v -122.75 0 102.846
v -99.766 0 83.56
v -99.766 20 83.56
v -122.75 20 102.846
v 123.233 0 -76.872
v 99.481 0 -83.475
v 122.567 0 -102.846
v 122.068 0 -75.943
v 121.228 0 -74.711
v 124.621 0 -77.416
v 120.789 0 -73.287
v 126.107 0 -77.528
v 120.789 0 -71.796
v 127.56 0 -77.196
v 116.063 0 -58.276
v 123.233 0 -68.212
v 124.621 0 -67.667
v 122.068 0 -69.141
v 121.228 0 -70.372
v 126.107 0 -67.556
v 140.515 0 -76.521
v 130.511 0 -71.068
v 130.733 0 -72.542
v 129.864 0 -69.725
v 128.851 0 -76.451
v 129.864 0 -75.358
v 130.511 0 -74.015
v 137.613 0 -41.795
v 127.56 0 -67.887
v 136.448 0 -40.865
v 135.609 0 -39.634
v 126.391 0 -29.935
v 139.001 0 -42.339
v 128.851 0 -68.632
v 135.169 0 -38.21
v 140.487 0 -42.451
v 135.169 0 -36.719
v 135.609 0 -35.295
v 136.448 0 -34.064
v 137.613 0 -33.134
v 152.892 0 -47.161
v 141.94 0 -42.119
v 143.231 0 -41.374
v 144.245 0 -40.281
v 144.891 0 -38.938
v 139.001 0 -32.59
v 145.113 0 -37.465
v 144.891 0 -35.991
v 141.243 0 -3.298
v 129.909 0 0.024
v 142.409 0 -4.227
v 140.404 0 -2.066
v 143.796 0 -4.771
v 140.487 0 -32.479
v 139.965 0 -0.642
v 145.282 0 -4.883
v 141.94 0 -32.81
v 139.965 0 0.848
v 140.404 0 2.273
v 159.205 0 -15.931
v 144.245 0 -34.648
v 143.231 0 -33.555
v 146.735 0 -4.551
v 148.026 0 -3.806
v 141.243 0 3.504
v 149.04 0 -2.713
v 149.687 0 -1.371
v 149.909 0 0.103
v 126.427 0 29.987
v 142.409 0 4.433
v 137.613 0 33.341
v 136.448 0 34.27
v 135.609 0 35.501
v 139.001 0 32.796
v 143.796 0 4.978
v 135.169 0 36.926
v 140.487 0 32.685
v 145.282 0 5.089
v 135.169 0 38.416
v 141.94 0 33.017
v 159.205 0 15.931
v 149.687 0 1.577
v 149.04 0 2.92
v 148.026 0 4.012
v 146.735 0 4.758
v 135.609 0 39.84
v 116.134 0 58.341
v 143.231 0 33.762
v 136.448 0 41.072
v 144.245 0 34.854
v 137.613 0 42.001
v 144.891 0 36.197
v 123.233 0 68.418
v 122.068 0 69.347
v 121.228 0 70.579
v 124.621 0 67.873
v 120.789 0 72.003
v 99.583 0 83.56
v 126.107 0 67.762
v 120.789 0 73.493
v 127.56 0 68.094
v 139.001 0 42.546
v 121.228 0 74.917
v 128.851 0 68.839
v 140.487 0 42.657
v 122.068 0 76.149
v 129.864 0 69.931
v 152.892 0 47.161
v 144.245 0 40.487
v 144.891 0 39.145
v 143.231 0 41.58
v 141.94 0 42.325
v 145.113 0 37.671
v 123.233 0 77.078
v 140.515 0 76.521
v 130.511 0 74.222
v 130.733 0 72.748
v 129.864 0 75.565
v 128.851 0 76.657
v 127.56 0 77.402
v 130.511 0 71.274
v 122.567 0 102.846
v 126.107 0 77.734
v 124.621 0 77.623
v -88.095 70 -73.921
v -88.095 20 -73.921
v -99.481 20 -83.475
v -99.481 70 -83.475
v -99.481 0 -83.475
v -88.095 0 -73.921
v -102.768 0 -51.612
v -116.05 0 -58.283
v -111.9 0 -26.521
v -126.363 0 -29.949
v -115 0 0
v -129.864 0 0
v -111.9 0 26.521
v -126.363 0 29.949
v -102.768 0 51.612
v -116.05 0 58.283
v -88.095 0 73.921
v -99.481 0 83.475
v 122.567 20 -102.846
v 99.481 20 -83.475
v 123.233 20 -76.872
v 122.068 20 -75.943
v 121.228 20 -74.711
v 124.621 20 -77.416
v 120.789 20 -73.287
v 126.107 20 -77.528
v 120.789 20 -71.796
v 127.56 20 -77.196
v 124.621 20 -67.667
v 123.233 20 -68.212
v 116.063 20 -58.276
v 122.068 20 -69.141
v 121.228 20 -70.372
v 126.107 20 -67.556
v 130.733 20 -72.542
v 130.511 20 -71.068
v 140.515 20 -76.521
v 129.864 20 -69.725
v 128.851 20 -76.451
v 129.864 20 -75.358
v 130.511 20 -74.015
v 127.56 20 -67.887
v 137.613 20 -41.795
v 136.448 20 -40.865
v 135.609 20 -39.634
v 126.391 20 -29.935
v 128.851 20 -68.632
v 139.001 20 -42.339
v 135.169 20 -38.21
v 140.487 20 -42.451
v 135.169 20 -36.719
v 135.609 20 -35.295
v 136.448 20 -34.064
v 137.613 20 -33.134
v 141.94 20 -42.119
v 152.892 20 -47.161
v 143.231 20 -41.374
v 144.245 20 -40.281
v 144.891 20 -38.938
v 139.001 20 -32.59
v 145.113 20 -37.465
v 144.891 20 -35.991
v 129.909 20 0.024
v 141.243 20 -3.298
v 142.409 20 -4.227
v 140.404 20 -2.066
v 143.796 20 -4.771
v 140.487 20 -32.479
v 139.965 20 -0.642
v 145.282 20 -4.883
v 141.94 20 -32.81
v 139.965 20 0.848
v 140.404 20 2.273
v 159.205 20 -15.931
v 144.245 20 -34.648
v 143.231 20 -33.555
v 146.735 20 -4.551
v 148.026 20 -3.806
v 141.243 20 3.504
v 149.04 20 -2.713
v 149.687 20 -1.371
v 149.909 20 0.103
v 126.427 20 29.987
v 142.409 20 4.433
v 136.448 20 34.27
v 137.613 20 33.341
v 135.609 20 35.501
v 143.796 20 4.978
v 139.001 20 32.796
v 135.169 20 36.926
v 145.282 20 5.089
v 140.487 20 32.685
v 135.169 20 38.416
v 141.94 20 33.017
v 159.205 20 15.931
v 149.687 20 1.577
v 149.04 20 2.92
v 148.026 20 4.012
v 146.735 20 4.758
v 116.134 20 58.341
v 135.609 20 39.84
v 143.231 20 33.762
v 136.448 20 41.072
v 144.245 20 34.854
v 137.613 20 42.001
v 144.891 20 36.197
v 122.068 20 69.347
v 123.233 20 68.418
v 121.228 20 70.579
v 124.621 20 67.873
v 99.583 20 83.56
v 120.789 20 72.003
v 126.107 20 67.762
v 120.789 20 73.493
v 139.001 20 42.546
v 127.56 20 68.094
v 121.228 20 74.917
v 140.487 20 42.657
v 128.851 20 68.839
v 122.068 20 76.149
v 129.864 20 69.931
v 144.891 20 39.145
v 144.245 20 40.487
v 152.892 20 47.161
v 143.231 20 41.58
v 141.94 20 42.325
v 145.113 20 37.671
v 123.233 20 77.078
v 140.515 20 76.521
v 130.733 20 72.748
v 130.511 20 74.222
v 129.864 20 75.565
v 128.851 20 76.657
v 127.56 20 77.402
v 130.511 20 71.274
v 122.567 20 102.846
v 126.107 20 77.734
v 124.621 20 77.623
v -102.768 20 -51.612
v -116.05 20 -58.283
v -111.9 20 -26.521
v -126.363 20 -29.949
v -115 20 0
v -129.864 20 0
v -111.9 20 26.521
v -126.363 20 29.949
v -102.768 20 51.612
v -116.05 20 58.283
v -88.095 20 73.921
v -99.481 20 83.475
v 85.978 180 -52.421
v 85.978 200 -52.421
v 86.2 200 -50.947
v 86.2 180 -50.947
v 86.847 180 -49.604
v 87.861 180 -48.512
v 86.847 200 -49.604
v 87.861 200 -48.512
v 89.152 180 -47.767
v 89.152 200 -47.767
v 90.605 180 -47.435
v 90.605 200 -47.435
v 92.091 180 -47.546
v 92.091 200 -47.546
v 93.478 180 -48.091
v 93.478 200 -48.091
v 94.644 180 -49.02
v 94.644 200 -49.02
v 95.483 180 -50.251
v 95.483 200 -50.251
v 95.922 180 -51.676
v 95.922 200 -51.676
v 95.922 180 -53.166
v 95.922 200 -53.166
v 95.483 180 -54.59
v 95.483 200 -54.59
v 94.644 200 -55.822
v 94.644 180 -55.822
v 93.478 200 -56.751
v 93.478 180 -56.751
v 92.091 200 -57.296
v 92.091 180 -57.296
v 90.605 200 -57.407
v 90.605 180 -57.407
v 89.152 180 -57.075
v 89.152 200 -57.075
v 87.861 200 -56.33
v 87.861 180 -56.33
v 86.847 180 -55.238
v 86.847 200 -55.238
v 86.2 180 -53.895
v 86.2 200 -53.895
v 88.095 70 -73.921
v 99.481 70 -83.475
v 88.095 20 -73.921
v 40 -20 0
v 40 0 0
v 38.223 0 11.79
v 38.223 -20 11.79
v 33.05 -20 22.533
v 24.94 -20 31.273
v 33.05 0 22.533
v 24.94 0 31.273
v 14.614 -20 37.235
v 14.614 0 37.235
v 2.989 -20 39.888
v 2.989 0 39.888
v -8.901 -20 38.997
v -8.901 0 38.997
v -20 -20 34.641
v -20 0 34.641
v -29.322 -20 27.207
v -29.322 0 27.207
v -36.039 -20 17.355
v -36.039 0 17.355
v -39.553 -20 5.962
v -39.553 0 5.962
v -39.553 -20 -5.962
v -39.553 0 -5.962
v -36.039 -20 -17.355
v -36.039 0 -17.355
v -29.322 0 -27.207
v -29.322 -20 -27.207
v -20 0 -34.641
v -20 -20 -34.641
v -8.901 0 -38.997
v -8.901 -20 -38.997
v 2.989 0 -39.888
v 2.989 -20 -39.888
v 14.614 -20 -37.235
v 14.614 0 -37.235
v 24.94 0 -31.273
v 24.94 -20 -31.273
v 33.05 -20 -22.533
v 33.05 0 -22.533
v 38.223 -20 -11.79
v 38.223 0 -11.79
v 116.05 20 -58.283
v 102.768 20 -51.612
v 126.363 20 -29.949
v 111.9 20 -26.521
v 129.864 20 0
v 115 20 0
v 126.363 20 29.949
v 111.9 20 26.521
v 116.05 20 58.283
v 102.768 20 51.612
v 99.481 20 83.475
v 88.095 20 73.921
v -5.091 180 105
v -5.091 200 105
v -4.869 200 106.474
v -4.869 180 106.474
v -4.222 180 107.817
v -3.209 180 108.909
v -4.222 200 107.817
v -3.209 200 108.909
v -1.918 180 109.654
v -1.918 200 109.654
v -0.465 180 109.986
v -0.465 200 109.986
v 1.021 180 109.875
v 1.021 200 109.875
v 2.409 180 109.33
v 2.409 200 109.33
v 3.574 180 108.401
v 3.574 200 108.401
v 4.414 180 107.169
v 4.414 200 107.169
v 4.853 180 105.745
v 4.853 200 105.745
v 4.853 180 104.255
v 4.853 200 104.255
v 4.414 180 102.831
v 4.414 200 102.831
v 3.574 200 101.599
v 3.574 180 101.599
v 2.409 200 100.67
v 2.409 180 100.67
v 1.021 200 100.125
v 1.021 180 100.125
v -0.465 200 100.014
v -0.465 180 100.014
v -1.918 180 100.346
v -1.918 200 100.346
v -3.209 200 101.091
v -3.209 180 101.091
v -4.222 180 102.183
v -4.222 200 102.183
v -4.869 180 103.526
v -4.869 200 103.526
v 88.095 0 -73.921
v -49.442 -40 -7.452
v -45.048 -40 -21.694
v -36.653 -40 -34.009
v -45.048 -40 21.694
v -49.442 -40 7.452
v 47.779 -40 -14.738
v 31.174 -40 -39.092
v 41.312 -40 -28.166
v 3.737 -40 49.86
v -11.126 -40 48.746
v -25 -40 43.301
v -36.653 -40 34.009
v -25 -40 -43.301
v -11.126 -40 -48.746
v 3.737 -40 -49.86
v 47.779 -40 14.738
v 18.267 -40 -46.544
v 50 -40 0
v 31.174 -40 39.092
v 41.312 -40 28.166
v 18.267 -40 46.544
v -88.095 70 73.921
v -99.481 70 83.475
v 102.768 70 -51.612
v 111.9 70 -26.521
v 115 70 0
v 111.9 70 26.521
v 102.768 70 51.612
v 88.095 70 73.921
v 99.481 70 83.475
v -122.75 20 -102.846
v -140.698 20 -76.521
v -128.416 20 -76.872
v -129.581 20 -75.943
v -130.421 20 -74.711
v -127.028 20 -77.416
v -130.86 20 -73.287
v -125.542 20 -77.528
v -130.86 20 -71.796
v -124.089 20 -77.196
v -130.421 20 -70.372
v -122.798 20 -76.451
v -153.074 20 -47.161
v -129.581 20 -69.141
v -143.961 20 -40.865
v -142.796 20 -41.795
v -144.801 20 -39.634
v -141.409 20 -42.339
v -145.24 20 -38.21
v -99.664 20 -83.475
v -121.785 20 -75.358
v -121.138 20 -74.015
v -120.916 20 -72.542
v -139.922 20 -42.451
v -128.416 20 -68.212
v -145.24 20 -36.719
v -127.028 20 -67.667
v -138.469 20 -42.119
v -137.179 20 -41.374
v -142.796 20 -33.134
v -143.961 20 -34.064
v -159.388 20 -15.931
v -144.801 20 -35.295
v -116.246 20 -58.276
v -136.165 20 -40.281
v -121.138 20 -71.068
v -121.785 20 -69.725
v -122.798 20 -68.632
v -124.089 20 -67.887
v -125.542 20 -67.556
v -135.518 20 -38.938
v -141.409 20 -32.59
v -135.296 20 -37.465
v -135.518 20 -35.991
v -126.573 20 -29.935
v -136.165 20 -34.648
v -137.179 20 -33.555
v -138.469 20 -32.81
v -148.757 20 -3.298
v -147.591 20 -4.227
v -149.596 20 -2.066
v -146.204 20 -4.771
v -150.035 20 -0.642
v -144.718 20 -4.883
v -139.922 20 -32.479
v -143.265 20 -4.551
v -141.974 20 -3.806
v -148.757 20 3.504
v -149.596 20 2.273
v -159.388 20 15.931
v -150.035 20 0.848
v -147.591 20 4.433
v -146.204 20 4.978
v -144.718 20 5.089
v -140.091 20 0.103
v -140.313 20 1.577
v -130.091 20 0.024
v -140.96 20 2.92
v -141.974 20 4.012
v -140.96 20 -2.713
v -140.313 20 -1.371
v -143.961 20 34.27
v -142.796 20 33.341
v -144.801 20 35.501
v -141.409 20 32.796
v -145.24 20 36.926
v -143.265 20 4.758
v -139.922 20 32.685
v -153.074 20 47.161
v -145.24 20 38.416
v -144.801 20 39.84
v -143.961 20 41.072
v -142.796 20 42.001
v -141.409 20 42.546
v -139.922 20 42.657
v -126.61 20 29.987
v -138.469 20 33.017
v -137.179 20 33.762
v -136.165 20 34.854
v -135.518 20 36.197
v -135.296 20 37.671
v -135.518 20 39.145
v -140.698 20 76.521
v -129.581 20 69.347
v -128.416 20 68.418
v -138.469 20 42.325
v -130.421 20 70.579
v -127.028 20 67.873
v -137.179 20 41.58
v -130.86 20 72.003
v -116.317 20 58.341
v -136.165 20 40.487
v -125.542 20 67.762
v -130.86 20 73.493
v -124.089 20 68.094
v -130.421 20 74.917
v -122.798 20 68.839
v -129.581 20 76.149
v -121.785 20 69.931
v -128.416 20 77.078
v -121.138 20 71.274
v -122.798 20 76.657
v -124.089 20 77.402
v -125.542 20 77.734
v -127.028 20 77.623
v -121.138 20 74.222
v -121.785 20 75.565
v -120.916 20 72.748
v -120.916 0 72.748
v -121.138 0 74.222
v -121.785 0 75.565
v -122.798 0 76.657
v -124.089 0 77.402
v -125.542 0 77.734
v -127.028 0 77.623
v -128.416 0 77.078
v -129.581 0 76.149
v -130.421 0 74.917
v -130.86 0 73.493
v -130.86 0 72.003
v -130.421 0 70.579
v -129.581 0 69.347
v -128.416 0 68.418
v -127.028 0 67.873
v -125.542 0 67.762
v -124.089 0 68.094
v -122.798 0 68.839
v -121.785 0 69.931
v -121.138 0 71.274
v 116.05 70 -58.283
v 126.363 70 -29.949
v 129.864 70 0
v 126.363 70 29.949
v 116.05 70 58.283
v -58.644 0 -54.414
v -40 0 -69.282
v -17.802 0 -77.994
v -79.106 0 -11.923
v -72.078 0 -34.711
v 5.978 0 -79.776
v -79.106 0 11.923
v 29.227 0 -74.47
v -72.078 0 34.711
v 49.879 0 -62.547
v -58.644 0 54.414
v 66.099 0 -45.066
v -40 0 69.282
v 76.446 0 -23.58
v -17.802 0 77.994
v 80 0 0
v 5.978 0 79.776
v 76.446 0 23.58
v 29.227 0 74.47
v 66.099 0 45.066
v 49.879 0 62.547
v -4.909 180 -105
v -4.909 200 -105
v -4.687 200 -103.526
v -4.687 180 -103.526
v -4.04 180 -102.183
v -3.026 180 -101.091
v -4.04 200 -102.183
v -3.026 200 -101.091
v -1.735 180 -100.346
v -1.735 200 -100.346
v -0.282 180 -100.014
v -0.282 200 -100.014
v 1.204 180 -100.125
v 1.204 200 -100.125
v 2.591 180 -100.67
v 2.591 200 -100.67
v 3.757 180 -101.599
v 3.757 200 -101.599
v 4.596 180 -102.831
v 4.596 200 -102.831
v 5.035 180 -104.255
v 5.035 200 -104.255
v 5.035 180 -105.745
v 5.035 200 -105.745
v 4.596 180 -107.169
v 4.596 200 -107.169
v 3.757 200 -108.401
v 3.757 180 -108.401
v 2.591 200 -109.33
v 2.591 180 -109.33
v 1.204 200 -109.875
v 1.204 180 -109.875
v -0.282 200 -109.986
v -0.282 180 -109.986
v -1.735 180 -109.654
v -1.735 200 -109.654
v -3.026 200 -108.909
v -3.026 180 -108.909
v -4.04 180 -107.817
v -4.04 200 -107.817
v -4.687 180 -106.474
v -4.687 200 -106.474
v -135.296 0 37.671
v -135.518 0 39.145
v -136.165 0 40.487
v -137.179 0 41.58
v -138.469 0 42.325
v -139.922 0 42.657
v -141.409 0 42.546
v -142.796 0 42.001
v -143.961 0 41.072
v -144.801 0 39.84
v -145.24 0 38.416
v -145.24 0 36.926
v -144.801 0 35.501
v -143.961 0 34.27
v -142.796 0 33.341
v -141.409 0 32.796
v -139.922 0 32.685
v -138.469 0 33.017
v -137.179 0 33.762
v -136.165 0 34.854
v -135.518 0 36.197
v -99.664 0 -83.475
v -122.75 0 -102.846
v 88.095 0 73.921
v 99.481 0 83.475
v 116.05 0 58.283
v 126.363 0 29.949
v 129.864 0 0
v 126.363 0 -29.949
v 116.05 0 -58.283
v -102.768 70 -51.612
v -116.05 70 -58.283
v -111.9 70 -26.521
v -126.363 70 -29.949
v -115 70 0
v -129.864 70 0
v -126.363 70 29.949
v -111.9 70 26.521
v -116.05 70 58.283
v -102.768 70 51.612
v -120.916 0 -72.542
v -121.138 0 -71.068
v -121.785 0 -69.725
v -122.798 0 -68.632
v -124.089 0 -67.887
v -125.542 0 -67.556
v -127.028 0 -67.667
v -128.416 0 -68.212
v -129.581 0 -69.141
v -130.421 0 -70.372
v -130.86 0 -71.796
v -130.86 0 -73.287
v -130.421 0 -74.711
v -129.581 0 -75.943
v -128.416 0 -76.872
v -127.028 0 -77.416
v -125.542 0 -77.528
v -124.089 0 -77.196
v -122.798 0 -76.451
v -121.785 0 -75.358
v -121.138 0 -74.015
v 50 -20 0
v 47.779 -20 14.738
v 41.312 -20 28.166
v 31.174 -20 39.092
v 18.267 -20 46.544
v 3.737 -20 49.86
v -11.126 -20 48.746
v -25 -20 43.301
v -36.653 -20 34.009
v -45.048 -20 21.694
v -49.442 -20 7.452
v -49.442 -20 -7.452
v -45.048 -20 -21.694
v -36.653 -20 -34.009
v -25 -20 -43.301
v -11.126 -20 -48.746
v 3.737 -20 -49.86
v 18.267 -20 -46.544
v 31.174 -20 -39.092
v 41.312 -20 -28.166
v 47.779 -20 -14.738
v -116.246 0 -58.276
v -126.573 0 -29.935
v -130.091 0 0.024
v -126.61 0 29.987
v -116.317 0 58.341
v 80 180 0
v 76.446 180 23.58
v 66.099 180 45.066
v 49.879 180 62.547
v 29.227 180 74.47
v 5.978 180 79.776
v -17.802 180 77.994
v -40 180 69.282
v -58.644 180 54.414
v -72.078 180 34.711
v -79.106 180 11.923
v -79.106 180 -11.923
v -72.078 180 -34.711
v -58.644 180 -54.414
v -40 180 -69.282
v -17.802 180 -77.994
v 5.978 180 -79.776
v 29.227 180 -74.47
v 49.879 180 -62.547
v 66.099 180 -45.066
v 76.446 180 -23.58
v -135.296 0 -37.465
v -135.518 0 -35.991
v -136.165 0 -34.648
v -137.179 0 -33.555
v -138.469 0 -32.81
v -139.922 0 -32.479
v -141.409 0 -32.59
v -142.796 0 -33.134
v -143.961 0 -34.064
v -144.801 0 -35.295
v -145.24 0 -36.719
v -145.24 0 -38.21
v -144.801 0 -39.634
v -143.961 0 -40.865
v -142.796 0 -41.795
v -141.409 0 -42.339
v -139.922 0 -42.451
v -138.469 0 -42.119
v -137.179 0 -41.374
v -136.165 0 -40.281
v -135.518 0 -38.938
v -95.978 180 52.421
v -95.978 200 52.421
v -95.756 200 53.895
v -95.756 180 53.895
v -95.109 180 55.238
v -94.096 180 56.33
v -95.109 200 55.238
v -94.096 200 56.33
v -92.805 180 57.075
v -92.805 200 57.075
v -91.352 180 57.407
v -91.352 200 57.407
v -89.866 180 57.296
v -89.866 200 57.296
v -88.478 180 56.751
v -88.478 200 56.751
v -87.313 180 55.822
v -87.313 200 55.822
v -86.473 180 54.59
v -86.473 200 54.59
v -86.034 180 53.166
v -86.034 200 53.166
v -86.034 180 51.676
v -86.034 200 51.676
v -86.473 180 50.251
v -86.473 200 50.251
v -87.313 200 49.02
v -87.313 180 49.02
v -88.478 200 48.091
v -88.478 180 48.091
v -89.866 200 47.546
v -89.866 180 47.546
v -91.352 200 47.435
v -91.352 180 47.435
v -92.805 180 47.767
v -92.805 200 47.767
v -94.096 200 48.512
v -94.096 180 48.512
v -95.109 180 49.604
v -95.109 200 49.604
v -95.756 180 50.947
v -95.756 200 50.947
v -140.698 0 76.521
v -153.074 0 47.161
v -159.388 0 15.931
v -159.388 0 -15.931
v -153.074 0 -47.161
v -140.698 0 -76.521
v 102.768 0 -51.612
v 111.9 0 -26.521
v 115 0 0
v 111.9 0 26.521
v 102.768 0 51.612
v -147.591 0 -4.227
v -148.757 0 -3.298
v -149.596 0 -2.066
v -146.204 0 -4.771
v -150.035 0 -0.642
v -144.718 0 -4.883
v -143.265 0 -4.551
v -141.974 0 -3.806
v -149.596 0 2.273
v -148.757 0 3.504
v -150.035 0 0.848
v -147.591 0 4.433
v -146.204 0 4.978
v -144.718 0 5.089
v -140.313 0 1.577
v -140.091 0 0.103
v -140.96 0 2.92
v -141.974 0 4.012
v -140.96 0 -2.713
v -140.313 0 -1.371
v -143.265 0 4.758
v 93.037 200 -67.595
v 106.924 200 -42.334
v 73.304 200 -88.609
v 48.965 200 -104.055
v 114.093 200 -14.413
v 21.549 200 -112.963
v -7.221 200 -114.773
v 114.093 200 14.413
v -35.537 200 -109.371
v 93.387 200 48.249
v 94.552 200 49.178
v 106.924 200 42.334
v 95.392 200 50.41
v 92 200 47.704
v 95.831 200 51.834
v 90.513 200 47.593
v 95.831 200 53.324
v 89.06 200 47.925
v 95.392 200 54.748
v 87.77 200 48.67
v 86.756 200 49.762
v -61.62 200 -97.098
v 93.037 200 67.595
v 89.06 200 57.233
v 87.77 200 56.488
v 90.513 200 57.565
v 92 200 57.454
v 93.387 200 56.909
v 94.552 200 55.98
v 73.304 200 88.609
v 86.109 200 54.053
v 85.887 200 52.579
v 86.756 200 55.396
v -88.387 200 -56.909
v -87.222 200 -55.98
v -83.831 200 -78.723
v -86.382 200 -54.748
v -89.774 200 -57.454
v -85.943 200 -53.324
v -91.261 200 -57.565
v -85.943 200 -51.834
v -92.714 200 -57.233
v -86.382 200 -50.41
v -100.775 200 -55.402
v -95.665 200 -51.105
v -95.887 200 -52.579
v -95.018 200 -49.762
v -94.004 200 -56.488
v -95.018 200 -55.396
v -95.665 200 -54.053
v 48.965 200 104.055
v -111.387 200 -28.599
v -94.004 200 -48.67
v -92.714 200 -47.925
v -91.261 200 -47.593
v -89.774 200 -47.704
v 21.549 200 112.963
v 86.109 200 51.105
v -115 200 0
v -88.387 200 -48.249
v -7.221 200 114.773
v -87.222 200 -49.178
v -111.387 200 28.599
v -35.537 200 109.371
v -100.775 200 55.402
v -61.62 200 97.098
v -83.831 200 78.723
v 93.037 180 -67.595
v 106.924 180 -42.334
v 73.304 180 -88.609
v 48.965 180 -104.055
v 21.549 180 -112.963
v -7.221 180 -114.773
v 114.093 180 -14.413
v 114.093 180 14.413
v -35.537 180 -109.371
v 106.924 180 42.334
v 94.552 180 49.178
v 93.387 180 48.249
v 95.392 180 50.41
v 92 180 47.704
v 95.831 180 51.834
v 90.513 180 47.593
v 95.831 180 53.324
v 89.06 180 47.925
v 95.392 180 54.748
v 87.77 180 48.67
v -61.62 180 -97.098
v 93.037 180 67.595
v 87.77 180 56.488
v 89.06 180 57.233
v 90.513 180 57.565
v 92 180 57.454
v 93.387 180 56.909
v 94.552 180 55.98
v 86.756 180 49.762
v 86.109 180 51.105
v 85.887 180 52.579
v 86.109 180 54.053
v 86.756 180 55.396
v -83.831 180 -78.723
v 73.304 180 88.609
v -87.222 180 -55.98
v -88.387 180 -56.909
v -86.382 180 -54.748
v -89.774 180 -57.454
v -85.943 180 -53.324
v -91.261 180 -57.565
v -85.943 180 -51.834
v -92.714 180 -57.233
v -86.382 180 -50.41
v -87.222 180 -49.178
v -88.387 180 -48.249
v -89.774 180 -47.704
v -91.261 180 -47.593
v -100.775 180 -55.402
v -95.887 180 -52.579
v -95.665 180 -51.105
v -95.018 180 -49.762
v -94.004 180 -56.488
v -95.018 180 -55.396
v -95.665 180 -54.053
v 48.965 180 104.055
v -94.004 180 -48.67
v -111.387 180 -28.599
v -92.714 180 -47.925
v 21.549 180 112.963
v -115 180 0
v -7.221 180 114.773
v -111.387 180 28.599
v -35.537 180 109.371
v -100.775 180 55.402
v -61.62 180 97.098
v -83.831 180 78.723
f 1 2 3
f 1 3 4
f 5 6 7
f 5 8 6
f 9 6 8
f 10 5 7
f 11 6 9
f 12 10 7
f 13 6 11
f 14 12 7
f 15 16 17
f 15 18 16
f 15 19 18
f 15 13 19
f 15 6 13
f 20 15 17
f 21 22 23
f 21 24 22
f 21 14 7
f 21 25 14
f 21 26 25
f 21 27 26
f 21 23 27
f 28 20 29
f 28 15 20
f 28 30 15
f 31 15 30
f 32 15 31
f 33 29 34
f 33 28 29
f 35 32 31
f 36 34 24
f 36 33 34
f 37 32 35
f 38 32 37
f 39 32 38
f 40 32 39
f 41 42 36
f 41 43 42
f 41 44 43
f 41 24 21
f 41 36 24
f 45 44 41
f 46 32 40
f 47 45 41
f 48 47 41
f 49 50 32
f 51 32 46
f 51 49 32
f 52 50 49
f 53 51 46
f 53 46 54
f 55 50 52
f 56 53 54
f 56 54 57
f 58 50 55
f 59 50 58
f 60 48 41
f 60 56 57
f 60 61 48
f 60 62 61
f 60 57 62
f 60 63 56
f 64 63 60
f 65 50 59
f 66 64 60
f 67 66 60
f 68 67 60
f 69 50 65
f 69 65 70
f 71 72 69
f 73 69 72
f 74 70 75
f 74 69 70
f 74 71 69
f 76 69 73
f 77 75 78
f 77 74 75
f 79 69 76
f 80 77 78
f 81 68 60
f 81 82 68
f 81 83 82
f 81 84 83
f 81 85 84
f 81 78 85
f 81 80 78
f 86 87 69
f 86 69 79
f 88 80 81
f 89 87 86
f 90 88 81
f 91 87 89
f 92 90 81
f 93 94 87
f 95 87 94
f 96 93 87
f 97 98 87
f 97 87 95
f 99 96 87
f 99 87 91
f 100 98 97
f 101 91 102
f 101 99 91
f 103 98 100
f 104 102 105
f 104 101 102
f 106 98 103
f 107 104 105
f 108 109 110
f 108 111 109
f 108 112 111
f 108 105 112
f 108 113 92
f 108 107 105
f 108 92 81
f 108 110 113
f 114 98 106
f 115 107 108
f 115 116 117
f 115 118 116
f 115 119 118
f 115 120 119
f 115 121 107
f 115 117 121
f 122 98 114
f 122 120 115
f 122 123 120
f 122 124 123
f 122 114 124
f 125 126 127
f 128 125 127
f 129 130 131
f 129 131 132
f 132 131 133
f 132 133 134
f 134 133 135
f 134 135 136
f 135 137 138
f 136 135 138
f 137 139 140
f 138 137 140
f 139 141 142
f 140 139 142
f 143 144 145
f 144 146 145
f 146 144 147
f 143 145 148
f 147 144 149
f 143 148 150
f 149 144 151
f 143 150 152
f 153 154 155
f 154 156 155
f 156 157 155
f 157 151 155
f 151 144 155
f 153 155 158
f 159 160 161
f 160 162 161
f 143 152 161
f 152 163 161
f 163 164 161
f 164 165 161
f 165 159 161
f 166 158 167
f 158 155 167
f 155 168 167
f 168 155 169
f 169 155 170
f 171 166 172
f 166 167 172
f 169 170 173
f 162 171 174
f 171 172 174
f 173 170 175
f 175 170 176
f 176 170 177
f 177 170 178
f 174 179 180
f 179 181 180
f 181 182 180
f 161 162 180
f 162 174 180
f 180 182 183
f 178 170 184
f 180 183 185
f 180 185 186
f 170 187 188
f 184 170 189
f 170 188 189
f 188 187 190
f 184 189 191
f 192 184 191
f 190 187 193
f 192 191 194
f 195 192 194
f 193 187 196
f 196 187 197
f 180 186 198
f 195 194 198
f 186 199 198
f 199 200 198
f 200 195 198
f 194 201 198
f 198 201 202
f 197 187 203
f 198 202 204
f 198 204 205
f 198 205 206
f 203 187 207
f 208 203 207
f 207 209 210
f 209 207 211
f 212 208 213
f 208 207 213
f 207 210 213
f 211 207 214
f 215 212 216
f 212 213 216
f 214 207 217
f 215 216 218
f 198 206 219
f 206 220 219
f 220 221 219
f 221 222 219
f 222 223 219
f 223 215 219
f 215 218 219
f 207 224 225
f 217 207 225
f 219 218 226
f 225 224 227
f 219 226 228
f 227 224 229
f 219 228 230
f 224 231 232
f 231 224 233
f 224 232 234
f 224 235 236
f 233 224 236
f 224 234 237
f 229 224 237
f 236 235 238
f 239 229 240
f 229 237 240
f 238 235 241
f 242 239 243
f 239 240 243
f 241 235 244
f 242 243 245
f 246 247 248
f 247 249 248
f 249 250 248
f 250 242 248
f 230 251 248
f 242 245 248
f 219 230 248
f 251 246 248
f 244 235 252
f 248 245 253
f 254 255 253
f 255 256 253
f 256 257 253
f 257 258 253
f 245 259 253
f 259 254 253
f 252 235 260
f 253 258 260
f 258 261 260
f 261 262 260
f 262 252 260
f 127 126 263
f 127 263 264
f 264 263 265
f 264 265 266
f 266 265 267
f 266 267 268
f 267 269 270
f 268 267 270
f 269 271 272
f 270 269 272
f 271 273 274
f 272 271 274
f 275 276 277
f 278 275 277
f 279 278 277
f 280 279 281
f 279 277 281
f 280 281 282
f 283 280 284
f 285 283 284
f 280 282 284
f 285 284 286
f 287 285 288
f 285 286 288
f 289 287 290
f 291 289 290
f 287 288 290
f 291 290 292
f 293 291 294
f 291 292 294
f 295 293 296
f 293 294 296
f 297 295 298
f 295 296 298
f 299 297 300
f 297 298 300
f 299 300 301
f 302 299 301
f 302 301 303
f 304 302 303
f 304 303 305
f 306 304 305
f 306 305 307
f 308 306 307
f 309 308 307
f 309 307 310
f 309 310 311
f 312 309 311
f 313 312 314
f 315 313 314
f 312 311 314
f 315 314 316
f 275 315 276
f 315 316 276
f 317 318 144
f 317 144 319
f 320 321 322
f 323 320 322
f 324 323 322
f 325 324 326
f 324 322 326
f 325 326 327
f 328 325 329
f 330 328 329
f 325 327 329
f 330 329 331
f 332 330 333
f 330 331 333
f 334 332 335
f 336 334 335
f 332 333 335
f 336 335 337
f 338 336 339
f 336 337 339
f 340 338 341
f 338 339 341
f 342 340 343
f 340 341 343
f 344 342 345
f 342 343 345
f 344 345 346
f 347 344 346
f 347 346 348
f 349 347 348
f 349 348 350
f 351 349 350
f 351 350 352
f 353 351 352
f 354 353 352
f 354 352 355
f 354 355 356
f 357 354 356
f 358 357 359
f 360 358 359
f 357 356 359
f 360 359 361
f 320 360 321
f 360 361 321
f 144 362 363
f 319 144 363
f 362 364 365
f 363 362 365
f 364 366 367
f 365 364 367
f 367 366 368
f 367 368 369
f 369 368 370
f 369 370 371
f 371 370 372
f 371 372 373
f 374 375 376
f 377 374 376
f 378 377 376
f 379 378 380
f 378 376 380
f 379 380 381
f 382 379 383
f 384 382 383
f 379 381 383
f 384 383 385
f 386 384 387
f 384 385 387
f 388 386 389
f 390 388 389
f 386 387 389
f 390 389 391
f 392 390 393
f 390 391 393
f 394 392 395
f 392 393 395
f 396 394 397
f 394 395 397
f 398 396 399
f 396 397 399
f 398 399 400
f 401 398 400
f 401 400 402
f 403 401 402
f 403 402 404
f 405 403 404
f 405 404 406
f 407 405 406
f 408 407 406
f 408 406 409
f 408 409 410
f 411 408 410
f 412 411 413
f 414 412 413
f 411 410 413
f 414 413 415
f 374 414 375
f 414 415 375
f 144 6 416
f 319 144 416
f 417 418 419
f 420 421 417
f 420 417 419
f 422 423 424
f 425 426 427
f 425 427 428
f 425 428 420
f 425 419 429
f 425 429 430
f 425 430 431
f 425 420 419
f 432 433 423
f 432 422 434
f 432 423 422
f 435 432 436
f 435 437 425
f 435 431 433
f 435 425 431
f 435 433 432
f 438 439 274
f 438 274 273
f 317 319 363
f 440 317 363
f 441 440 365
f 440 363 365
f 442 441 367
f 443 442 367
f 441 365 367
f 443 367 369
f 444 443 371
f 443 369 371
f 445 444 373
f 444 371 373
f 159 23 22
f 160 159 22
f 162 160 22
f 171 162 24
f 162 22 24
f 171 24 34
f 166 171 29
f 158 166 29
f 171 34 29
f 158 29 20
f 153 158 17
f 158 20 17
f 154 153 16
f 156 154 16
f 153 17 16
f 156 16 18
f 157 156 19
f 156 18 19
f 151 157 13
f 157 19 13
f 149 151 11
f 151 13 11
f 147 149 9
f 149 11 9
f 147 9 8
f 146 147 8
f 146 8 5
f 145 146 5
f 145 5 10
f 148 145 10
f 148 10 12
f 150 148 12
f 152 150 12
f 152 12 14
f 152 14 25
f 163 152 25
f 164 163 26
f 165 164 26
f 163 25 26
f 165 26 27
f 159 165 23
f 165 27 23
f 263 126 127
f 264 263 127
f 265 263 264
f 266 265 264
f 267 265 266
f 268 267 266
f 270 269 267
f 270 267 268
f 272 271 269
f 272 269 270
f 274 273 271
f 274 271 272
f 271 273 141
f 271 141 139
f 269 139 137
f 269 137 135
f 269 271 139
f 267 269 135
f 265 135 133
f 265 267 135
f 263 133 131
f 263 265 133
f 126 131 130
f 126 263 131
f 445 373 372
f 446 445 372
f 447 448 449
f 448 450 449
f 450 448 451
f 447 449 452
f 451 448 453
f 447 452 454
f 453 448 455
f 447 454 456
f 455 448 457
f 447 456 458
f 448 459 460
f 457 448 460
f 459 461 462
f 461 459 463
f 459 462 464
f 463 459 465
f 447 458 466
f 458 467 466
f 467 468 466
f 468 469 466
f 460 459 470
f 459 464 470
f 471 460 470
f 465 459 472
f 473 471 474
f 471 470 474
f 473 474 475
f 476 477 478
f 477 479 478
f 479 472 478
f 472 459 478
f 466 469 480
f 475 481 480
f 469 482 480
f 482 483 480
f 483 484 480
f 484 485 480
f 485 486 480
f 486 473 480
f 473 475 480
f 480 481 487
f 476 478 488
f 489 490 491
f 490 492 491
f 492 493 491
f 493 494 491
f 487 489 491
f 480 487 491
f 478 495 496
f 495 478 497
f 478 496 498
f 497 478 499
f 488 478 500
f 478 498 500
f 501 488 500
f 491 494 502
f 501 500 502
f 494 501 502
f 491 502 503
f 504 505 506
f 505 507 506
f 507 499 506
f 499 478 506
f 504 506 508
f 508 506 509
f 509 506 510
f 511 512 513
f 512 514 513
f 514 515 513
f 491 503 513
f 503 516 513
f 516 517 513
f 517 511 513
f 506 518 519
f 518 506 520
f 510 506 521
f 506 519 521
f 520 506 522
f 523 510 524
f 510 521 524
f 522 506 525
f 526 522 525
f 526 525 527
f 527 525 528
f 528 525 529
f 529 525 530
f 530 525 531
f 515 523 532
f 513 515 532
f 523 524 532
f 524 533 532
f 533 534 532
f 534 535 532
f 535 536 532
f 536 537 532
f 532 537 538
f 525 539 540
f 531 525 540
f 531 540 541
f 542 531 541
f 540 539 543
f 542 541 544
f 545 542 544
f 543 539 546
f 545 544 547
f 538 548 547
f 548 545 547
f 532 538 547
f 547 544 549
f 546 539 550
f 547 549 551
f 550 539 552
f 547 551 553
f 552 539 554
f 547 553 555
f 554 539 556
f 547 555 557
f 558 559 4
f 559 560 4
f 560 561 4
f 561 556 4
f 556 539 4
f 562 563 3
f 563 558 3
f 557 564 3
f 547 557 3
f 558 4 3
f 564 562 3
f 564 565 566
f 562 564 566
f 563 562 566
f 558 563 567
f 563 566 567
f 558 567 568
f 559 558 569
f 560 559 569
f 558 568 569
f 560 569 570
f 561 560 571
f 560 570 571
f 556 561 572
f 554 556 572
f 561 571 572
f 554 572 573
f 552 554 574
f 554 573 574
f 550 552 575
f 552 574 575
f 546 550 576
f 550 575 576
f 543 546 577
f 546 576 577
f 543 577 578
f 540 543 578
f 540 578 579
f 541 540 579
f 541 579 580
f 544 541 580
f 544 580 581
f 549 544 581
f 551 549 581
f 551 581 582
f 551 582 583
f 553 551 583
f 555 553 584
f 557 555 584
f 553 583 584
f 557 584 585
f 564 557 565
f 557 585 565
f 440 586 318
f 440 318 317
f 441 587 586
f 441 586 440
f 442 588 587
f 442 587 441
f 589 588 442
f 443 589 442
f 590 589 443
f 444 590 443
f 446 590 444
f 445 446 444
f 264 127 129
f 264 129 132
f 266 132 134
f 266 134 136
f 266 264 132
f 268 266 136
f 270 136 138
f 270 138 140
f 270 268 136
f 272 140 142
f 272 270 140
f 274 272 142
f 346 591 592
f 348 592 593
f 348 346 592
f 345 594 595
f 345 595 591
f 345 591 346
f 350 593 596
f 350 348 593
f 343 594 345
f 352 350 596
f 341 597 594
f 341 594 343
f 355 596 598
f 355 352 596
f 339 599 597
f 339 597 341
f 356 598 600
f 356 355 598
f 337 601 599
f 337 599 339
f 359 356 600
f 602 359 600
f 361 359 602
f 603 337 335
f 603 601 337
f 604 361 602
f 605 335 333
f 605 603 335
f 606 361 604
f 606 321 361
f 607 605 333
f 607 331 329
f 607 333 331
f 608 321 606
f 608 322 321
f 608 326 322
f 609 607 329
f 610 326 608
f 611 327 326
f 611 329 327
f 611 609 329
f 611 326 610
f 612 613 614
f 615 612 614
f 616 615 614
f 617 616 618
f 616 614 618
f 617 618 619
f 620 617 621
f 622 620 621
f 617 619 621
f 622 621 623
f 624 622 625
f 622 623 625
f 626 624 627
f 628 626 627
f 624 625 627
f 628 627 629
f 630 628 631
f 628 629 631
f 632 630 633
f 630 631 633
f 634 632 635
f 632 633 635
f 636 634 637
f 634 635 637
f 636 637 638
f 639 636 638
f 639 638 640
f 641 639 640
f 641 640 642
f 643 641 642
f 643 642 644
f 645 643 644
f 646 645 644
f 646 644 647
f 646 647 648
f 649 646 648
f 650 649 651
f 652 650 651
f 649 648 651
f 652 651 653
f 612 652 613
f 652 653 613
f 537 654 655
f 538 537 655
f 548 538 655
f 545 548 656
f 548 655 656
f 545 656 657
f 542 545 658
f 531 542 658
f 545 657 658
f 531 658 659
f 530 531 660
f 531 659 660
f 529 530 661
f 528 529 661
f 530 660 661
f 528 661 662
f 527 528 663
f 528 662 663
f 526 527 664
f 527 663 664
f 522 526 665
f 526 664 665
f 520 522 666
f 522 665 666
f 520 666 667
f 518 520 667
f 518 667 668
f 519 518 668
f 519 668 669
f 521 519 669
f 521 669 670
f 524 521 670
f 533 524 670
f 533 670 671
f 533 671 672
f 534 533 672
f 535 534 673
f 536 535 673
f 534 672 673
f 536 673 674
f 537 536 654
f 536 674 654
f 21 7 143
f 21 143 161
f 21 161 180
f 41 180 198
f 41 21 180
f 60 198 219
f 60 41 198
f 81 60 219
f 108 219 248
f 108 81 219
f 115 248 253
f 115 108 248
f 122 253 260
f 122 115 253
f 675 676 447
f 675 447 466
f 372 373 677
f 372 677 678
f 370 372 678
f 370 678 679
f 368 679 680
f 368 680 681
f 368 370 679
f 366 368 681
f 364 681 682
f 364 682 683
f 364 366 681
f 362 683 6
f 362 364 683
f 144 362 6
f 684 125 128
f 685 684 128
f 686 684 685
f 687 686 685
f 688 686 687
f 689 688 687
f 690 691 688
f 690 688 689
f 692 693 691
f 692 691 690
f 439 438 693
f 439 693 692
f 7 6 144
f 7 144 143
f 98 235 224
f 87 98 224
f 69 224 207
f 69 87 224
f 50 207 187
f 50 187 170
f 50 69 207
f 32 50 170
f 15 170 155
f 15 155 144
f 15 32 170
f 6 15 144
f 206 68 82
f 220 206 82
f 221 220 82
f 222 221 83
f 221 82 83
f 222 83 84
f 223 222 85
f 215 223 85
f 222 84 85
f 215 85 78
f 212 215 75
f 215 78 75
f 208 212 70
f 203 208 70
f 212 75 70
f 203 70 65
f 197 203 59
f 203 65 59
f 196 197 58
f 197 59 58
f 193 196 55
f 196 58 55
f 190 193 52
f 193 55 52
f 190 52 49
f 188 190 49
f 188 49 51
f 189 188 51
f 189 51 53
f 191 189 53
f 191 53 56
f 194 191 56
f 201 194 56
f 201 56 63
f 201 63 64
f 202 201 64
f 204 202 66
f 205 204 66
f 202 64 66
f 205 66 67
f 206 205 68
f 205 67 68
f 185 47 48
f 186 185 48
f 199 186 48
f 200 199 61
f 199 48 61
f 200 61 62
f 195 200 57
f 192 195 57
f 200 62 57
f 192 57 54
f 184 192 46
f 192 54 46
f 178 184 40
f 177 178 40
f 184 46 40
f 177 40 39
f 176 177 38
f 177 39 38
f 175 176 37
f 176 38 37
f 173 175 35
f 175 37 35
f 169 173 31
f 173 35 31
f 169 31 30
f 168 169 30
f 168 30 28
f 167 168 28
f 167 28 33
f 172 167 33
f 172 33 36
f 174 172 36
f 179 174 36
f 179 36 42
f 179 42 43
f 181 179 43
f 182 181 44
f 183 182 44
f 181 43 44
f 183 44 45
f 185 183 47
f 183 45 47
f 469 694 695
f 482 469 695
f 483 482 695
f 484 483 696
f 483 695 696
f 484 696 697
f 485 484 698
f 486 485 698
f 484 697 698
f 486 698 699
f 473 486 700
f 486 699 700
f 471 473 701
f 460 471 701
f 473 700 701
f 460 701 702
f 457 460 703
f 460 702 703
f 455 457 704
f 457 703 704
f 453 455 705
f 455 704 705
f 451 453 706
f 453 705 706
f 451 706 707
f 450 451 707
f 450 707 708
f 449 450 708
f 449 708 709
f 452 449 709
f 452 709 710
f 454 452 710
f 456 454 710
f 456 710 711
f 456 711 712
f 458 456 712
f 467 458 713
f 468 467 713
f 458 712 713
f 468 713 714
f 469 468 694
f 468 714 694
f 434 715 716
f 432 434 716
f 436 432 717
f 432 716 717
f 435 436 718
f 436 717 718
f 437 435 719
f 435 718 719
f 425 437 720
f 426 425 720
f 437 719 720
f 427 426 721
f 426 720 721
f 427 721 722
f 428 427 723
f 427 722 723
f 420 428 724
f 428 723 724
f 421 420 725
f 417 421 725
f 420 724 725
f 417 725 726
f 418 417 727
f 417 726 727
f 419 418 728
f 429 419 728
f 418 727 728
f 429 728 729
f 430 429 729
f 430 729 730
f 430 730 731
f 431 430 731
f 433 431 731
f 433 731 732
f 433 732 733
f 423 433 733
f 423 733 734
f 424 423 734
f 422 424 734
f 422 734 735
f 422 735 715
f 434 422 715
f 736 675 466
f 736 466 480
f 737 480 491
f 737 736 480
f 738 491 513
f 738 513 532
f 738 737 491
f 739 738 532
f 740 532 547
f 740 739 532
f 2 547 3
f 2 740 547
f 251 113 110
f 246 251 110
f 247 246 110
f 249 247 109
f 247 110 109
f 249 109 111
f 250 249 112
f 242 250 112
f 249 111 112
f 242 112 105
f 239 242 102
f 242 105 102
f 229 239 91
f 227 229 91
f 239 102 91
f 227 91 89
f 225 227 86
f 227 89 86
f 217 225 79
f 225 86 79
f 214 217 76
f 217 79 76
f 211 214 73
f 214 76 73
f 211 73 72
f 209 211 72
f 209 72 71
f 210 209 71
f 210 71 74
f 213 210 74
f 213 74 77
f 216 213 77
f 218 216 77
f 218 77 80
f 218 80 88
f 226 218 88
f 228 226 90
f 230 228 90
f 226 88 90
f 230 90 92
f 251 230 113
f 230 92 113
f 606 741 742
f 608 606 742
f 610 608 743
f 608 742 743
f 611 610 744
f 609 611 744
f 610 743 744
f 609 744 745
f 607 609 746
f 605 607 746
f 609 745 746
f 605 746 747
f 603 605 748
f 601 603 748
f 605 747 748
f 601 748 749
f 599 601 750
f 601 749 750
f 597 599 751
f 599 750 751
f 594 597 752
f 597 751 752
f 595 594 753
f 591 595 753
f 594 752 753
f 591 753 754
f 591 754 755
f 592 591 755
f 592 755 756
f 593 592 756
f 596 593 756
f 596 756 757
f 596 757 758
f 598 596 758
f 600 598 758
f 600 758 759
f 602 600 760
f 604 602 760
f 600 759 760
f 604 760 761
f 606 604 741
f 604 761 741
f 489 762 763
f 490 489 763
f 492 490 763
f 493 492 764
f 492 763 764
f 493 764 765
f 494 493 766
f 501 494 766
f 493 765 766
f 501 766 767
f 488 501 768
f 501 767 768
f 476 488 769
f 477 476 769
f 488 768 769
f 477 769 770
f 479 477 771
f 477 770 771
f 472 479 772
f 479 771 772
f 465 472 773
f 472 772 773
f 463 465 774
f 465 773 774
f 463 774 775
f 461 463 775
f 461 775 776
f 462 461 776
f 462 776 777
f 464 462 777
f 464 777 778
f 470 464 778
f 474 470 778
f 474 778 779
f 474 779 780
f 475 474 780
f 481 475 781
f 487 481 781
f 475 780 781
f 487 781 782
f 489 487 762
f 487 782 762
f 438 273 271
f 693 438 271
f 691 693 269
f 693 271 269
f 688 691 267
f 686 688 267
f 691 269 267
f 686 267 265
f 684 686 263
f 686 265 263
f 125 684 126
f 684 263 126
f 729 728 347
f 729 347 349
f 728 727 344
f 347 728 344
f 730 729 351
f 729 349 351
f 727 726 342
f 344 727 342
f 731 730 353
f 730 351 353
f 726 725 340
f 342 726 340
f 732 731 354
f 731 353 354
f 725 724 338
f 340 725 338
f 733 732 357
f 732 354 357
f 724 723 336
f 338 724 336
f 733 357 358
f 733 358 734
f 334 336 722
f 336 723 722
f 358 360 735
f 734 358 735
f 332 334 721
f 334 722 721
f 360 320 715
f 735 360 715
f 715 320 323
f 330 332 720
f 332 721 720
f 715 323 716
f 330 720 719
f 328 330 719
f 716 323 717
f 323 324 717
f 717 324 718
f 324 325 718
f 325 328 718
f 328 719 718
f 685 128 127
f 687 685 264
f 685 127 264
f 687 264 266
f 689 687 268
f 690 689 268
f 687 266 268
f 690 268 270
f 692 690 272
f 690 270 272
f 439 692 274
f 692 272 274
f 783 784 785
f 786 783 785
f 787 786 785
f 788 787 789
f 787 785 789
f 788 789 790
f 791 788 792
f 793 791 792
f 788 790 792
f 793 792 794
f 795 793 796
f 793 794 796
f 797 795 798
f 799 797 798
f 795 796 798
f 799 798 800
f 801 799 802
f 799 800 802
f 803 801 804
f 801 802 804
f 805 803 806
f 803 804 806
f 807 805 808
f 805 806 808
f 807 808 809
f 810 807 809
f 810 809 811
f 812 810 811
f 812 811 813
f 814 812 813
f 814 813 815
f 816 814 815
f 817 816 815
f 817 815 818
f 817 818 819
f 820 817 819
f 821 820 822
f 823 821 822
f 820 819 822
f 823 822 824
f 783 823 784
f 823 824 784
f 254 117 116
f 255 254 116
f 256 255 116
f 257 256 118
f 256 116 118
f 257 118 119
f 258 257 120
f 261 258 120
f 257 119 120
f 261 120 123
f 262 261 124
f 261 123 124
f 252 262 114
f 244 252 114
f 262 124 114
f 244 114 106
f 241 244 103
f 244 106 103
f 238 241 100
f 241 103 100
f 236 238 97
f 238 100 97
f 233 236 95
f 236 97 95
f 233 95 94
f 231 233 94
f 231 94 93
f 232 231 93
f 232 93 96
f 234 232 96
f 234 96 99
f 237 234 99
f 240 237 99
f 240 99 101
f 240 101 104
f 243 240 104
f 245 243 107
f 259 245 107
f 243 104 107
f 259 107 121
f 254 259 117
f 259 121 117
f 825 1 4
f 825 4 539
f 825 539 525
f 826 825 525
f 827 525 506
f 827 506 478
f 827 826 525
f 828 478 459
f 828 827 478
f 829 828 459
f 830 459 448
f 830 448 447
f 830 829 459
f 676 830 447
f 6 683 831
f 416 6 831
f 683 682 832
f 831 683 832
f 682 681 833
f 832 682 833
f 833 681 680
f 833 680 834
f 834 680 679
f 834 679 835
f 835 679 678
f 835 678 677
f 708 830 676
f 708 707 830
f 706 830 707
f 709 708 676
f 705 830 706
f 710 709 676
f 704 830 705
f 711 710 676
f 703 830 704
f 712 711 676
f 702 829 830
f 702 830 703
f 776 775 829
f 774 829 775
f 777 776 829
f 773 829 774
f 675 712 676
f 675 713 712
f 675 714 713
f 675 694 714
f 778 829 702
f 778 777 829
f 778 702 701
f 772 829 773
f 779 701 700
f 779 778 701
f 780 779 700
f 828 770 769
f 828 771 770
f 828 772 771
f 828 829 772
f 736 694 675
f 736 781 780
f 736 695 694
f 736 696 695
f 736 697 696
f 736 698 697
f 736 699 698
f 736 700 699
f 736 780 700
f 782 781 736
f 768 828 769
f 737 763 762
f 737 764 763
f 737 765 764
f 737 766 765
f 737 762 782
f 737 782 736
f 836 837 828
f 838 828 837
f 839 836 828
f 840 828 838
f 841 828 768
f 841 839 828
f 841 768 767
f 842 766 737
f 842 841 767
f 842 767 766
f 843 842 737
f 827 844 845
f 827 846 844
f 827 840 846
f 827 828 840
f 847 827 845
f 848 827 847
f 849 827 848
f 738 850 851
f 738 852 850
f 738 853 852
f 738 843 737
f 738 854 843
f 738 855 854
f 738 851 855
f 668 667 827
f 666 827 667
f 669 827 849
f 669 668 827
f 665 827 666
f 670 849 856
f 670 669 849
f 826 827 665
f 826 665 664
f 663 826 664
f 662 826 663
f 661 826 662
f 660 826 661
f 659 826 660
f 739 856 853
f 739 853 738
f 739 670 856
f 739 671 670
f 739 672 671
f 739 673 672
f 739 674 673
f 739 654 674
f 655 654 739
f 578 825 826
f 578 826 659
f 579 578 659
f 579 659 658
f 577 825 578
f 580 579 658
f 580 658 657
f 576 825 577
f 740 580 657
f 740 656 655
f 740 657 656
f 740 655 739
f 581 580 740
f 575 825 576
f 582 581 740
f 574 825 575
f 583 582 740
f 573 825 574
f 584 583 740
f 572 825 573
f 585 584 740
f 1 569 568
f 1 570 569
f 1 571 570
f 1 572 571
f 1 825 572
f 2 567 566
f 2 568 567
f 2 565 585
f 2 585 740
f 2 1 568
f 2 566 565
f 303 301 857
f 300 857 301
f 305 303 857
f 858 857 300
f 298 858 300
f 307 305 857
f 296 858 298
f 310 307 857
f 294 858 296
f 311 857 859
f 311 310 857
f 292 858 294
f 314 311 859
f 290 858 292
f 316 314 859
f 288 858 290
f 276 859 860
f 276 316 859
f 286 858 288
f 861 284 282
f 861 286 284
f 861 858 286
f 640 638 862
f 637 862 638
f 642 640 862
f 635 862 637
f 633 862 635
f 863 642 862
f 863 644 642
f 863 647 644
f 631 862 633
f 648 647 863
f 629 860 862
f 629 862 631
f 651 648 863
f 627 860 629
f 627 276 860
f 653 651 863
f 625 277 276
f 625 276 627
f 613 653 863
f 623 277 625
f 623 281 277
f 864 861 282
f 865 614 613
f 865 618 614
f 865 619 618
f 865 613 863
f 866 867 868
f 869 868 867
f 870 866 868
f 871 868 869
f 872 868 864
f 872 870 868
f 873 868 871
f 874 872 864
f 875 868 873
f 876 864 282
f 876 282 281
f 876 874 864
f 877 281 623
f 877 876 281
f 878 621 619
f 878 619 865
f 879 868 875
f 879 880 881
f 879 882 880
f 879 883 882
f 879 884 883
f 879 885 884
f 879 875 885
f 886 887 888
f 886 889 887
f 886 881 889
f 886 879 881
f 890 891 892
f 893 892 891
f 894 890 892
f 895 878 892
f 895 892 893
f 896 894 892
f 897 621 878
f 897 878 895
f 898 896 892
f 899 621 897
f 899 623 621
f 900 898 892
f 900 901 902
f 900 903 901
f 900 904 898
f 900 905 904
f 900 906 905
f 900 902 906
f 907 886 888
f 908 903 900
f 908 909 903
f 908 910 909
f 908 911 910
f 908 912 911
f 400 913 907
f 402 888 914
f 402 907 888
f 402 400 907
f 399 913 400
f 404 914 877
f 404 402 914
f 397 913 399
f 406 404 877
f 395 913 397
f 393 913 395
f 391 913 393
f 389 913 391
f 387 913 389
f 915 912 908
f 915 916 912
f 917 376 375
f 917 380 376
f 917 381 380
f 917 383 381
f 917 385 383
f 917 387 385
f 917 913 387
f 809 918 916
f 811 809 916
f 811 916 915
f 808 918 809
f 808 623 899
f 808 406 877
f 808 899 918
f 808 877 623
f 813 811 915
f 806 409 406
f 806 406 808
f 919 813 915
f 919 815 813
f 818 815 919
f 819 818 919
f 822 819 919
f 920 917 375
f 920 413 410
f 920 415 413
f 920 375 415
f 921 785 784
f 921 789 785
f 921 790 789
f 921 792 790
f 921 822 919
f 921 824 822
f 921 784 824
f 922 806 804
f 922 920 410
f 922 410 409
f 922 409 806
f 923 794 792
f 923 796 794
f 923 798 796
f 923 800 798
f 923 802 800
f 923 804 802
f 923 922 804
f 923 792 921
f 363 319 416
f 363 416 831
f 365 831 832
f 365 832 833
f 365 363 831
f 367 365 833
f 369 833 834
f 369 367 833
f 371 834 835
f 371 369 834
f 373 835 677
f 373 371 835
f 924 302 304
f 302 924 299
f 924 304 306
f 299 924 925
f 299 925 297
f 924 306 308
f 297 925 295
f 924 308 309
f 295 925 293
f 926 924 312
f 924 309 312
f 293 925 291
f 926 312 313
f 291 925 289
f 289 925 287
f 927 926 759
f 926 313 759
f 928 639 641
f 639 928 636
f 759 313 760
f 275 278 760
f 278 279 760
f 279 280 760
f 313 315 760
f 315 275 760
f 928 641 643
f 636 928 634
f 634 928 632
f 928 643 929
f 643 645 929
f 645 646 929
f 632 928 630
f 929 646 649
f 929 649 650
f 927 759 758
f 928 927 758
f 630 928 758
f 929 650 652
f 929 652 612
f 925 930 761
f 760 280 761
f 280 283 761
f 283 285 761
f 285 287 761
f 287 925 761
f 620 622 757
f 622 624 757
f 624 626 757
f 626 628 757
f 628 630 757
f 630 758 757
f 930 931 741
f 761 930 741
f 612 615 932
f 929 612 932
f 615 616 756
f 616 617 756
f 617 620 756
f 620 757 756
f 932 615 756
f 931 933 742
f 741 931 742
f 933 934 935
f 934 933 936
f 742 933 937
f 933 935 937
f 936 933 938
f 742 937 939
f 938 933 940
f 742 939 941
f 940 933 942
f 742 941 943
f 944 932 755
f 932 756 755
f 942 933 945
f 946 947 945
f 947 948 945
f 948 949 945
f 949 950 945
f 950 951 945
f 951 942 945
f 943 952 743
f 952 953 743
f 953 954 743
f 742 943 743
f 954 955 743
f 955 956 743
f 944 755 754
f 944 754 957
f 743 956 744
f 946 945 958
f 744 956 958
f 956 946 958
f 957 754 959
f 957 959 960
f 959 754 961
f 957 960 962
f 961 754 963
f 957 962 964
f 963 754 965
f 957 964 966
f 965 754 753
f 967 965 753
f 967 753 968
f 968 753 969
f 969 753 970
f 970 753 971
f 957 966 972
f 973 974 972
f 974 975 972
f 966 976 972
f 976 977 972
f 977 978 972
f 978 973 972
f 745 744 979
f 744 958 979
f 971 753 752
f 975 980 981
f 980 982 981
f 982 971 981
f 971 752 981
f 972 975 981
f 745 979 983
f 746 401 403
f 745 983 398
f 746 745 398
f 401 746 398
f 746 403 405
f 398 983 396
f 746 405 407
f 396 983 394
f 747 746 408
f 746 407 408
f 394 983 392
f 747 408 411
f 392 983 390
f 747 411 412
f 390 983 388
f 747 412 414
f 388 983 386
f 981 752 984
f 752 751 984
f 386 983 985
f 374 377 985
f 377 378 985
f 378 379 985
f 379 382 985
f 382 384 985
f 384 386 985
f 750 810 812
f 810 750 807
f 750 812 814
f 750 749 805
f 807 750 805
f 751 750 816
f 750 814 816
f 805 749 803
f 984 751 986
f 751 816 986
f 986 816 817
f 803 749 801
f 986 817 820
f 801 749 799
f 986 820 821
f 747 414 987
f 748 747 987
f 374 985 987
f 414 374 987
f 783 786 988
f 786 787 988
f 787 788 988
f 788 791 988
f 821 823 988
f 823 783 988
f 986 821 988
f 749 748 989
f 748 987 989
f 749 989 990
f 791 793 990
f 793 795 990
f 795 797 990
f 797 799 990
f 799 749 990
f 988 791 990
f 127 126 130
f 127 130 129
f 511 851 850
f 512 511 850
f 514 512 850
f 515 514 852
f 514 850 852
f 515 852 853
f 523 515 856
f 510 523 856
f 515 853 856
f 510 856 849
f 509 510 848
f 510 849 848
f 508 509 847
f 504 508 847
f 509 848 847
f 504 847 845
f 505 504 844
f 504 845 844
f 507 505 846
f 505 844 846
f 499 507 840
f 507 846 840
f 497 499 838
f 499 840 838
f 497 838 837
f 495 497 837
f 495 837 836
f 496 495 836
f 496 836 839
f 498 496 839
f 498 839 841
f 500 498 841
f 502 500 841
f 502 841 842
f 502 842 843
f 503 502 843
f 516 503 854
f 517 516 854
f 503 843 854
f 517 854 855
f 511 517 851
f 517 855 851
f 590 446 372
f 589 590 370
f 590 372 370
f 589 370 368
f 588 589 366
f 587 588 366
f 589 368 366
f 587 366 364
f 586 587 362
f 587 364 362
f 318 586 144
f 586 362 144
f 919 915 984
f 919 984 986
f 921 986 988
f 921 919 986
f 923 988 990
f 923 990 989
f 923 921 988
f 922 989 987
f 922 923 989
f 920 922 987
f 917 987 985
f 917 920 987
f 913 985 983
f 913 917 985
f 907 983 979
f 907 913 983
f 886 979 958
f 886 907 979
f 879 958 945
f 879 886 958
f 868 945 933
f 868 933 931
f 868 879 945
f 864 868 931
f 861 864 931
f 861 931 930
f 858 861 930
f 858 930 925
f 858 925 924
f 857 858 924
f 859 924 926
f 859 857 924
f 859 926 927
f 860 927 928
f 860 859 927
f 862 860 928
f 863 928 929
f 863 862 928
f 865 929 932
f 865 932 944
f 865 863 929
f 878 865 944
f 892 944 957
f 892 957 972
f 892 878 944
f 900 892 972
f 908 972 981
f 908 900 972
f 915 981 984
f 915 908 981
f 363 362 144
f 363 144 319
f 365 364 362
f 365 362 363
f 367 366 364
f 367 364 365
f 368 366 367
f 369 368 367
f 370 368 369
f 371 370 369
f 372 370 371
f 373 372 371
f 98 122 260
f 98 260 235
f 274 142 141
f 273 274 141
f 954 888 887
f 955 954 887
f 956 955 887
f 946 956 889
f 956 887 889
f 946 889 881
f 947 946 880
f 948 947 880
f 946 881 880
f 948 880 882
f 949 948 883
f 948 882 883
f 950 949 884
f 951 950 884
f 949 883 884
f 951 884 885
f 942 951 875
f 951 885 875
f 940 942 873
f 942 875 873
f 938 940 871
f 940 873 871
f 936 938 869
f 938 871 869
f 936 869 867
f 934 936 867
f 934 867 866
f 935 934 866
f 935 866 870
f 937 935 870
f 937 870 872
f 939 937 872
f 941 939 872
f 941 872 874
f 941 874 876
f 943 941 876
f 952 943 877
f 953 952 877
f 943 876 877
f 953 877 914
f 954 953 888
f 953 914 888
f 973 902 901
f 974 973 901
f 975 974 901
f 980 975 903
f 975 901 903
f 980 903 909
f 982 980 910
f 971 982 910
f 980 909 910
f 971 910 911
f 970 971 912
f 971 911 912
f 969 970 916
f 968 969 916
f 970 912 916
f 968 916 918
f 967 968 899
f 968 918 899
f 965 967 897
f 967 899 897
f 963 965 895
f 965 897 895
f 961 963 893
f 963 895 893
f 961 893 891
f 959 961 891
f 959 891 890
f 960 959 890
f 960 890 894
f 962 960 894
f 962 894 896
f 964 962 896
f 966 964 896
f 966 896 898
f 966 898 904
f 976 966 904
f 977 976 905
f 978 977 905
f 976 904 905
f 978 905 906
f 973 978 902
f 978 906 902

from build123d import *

# Parameters (mm, degrees)
F0_R      = 5
F1_DEPTH  = 20
F3_R      = 115
F3_R_2    = 5
F3_R_3    = 95
F4_DEPTH  = 20
F5_R      = 80
F6_DEPTH  = 180
F7_R      = 50
F7_R_2    = 40
F8_DEPTH  = 40
F9_DEPTH  = 20
F11_DEPTH = 20
F12_DEPTH = 50


with BuildPart() as f1:
    # F0 (on Front) → F1 (new body)
    with BuildSketch(Plane.XZ):
        with BuildLine():
            Line((122.567110899, 102.8460175499), (99.5829498528, 83.5600164931))
            ThreePointArc((99.5829498528, 83.5600164931), (129.9086831953, 0.0241370063), (99.481402654, -83.4748082759))
            Line((99.481402654, -83.4748082759), (122.567110899, -102.8460175499))
            ThreePointArc((122.567110899, -102.8460175499), (160, 0), (122.567110899, 102.8460175499))
        make_face()
        with Locations((125.7332297188, -72.5416527074)):
            Circle(F0_R, mode=Mode.SUBTRACT)
        with Locations((140.1133790573, -37.4645593656)):
            Circle(F0_R, mode=Mode.SUBTRACT)
        with Locations((144.9087072187, 0.1031692286)):
            Circle(F0_R, mode=Mode.SUBTRACT)
        with Locations((140.1133790573, 37.6708978229)):
            Circle(F0_R, mode=Mode.SUBTRACT)
        with Locations((125.7332297188, 72.7479911647)):
            Circle(F0_R, mode=Mode.SUBTRACT)
    extrude(amount=-F1_DEPTH)


with BuildPart() as f1b:
    # F0 (on Front) → F1, piece 2 (new body)
    with BuildSketch(Plane.XZ):
        with BuildLine():
            ThreePointArc((-99.6639882165, -83.4748082759), (-130.0912687578, 0.0241370063), (-99.7655354154, 83.5600164931))
            Line((-99.7655354154, 83.5600164931), (-122.7496964616, 102.8460175499))
            ThreePointArc((-122.7496964616, 102.8460175499), (-160.1825855625, 0), (-122.7496964616, -102.8460175499))
            Line((-122.7496964616, -102.8460175499), (-99.6639882165, -83.4748082759))
        make_face()
        with Locations((-125.9158152813, -72.5416527074)):
            Circle(F0_R, mode=Mode.SUBTRACT)
        with Locations((-140.2959646198, -37.4645593656)):
            Circle(F0_R, mode=Mode.SUBTRACT)
        with Locations((-145.0912927813, 0.1031692286)):
            Circle(F0_R, mode=Mode.SUBTRACT)
        with Locations((-140.2959646198, 37.6708978229)):
            Circle(F0_R, mode=Mode.SUBTRACT)
        with Locations((-125.9158152813, 72.7479911647)):
            Circle(F0_R, mode=Mode.SUBTRACT)
    extrude(amount=-F1_DEPTH)


with BuildPart() as f4:
    # F3 (on offset) → F4 (new body)
    with BuildSketch(Plane(origin=(0, 200, 0), x_dir=(-1, 0, 0), z_dir=(0, 1, 0))):
        Circle(F3_R)
        with Locations((-0.0912927813, -104.9999603125)):
            Circle(F3_R_2, mode=Mode.SUBTRACT)
        with Locations((-90.9782794176, -52.4209182885)):
            Circle(F3_R_2, mode=Mode.SUBTRACT)
        with Locations((90.8869866364, -52.579042024)):
            Circle(F3_R_2, mode=Mode.SUBTRACT)
        with Locations((-90.8869866364, 52.579042024)):
            Circle(F3_R_2, mode=Mode.SUBTRACT)
        Circle(F3_R_3, mode=Mode.SUBTRACT)
        with Locations((90.9782794176, 52.4209182885)):
            Circle(F3_R_2, mode=Mode.SUBTRACT)
        with Locations((0.0912927813, 104.9999603125)):
            Circle(F3_R_2, mode=Mode.SUBTRACT)
        Circle(F3_R_3)
    extrude(amount=-F4_DEPTH)

    # F5 (on face) → F6 (join)
    with BuildSketch(Plane.XZ.offset(-180)):
        Circle(F5_R)
    extrude(amount=F6_DEPTH)

    # F7 (on face) → F8 (join)
    with BuildSketch(Plane.XZ):
        Circle(F7_R)
        Circle(F7_R_2, mode=Mode.SUBTRACT)
        Circle(F7_R_2)
    extrude(amount=F8_DEPTH)

    # F7 (on face) → F9 (cut)
    with BuildSketch(Plane.XZ):
        Circle(F7_R)
        Circle(F7_R_2, mode=Mode.SUBTRACT)
    extrude(amount=F9_DEPTH, mode=Mode.SUBTRACT)


with BuildPart() as f11:
    # F10 (on face) → F11 (new body)
    with BuildSketch(Plane(origin=(0, 20, 0), x_dir=(-1, 0, 0), z_dir=(0, 1, 0))):
        with BuildLine():
            Line((88.0951109587, -73.920575114), (99.481402654, -83.4748082759))
            ThreePointArc((99.481402654, -83.4748082759), (129.8637481775, 0), (99.481402654, 83.4748082759))
            Line((99.481402654, 83.4748082759), (88.0951109587, 73.920575114))
            ThreePointArc((88.0951109587, 73.920575114), (115, 0), (88.0951109587, -73.920575114))
        make_face()
    extrude(amount=-F11_DEPTH)


with BuildPart() as f11b:
    # F10 (on face) → F11, piece 2 (new body)
    with BuildSketch(Plane(origin=(0, 20, 0), x_dir=(-1, 0, 0), z_dir=(0, 1, 0))):
        with BuildLine():
            Line((-88.0951109587, 73.920575114), (-99.481402654, 83.4748082759))
            ThreePointArc((-99.481402654, 83.4748082759), (-129.8637481775, 0), (-99.481402654, -83.4748082759))
            Line((-99.481402654, -83.4748082759), (-88.0951109587, -73.920575114))
            ThreePointArc((-88.0951109587, -73.920575114), (-115, 0), (-88.0951109587, 73.920575114))
        make_face()
    extrude(amount=-F11_DEPTH)


with BuildPart() as f12:
    # F10 (on face) → F12 (new body)
    with BuildSketch(Plane(origin=(0, 20, 0), x_dir=(-1, 0, 0), z_dir=(0, 1, 0))):
        with BuildLine():
            Line((88.0951109587, -73.920575114), (99.481402654, -83.4748082759))
            ThreePointArc((99.481402654, -83.4748082759), (129.8637481775, 0), (99.481402654, 83.4748082759))
            Line((99.481402654, 83.4748082759), (88.0951109587, 73.920575114))
            ThreePointArc((88.0951109587, 73.920575114), (115, 0), (88.0951109587, -73.920575114))
        make_face()
    extrude(amount=F12_DEPTH)


with BuildPart() as f12b:
    # F10 (on face) → F12, piece 2 (new body)
    with BuildSketch(Plane(origin=(0, 20, 0), x_dir=(-1, 0, 0), z_dir=(0, 1, 0))):
        with BuildLine():
            Line((-88.0951109587, 73.920575114), (-99.481402654, 83.4748082759))
            ThreePointArc((-99.481402654, 83.4748082759), (-129.8637481775, 0), (-99.481402654, -83.4748082759))
            Line((-99.481402654, -83.4748082759), (-88.0951109587, -73.920575114))
            ThreePointArc((-88.0951109587, -73.920575114), (-115, 0), (-88.0951109587, 73.920575114))
        make_face()
    extrude(amount=F12_DEPTH)


solid = Compound([f1.part, f1b.part, f4.part, f11.part, f11b.part, f12.part, f12b.part])
